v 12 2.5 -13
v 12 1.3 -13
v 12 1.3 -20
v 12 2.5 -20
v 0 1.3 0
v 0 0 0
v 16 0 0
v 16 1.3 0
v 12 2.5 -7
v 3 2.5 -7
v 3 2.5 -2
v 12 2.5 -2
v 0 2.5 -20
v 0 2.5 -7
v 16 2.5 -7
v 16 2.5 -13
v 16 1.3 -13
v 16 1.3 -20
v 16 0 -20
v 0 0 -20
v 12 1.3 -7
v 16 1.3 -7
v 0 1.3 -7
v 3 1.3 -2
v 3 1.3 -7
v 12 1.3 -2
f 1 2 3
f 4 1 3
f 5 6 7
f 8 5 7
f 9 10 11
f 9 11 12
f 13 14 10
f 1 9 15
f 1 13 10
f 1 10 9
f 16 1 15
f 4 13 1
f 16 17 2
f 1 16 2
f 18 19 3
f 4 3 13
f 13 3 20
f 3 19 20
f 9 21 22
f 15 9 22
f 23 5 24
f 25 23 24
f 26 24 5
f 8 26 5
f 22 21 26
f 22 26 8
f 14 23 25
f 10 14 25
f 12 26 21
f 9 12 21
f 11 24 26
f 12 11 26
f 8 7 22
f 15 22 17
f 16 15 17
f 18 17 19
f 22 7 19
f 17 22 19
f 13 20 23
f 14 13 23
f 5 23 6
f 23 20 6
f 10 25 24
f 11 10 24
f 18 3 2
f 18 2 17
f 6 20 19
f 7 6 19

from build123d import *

# Parameters (mm, degrees)
SKETCH1_W           = 16
SKETCH1_H           = 20
BOSS_EXTRUDE1_DEPTH = 1.3
BOSS_EXTRUDE2_DEPTH = 1.2


with BuildPart() as part:
    # Sketch1 → Boss-Extrude1 (new body)
    with BuildSketch(Plane(origin=(0, 0, 0), x_dir=(1, 0, 0), z_dir=(0, 1, 0))):
        with Locations((8, 10)):
            Rectangle(SKETCH1_W, SKETCH1_H)
    extrude(amount=BOSS_EXTRUDE1_DEPTH)

    # Sketch2 → Boss-Extrude2 (add)
    with BuildSketch(Plane(origin=(0, 1.3, 0), x_dir=(1, 0, 0), z_dir=(0, 1, 0))):
        Polygon((3, 7), (3, 2), (12, 2), (12, 7), (16, 7), (16, 13), (12, 13), (12, 20), (0, 20), (0, 7), align=None)
    extrude(amount=BOSS_EXTRUDE2_DEPTH)


solid = part.part
